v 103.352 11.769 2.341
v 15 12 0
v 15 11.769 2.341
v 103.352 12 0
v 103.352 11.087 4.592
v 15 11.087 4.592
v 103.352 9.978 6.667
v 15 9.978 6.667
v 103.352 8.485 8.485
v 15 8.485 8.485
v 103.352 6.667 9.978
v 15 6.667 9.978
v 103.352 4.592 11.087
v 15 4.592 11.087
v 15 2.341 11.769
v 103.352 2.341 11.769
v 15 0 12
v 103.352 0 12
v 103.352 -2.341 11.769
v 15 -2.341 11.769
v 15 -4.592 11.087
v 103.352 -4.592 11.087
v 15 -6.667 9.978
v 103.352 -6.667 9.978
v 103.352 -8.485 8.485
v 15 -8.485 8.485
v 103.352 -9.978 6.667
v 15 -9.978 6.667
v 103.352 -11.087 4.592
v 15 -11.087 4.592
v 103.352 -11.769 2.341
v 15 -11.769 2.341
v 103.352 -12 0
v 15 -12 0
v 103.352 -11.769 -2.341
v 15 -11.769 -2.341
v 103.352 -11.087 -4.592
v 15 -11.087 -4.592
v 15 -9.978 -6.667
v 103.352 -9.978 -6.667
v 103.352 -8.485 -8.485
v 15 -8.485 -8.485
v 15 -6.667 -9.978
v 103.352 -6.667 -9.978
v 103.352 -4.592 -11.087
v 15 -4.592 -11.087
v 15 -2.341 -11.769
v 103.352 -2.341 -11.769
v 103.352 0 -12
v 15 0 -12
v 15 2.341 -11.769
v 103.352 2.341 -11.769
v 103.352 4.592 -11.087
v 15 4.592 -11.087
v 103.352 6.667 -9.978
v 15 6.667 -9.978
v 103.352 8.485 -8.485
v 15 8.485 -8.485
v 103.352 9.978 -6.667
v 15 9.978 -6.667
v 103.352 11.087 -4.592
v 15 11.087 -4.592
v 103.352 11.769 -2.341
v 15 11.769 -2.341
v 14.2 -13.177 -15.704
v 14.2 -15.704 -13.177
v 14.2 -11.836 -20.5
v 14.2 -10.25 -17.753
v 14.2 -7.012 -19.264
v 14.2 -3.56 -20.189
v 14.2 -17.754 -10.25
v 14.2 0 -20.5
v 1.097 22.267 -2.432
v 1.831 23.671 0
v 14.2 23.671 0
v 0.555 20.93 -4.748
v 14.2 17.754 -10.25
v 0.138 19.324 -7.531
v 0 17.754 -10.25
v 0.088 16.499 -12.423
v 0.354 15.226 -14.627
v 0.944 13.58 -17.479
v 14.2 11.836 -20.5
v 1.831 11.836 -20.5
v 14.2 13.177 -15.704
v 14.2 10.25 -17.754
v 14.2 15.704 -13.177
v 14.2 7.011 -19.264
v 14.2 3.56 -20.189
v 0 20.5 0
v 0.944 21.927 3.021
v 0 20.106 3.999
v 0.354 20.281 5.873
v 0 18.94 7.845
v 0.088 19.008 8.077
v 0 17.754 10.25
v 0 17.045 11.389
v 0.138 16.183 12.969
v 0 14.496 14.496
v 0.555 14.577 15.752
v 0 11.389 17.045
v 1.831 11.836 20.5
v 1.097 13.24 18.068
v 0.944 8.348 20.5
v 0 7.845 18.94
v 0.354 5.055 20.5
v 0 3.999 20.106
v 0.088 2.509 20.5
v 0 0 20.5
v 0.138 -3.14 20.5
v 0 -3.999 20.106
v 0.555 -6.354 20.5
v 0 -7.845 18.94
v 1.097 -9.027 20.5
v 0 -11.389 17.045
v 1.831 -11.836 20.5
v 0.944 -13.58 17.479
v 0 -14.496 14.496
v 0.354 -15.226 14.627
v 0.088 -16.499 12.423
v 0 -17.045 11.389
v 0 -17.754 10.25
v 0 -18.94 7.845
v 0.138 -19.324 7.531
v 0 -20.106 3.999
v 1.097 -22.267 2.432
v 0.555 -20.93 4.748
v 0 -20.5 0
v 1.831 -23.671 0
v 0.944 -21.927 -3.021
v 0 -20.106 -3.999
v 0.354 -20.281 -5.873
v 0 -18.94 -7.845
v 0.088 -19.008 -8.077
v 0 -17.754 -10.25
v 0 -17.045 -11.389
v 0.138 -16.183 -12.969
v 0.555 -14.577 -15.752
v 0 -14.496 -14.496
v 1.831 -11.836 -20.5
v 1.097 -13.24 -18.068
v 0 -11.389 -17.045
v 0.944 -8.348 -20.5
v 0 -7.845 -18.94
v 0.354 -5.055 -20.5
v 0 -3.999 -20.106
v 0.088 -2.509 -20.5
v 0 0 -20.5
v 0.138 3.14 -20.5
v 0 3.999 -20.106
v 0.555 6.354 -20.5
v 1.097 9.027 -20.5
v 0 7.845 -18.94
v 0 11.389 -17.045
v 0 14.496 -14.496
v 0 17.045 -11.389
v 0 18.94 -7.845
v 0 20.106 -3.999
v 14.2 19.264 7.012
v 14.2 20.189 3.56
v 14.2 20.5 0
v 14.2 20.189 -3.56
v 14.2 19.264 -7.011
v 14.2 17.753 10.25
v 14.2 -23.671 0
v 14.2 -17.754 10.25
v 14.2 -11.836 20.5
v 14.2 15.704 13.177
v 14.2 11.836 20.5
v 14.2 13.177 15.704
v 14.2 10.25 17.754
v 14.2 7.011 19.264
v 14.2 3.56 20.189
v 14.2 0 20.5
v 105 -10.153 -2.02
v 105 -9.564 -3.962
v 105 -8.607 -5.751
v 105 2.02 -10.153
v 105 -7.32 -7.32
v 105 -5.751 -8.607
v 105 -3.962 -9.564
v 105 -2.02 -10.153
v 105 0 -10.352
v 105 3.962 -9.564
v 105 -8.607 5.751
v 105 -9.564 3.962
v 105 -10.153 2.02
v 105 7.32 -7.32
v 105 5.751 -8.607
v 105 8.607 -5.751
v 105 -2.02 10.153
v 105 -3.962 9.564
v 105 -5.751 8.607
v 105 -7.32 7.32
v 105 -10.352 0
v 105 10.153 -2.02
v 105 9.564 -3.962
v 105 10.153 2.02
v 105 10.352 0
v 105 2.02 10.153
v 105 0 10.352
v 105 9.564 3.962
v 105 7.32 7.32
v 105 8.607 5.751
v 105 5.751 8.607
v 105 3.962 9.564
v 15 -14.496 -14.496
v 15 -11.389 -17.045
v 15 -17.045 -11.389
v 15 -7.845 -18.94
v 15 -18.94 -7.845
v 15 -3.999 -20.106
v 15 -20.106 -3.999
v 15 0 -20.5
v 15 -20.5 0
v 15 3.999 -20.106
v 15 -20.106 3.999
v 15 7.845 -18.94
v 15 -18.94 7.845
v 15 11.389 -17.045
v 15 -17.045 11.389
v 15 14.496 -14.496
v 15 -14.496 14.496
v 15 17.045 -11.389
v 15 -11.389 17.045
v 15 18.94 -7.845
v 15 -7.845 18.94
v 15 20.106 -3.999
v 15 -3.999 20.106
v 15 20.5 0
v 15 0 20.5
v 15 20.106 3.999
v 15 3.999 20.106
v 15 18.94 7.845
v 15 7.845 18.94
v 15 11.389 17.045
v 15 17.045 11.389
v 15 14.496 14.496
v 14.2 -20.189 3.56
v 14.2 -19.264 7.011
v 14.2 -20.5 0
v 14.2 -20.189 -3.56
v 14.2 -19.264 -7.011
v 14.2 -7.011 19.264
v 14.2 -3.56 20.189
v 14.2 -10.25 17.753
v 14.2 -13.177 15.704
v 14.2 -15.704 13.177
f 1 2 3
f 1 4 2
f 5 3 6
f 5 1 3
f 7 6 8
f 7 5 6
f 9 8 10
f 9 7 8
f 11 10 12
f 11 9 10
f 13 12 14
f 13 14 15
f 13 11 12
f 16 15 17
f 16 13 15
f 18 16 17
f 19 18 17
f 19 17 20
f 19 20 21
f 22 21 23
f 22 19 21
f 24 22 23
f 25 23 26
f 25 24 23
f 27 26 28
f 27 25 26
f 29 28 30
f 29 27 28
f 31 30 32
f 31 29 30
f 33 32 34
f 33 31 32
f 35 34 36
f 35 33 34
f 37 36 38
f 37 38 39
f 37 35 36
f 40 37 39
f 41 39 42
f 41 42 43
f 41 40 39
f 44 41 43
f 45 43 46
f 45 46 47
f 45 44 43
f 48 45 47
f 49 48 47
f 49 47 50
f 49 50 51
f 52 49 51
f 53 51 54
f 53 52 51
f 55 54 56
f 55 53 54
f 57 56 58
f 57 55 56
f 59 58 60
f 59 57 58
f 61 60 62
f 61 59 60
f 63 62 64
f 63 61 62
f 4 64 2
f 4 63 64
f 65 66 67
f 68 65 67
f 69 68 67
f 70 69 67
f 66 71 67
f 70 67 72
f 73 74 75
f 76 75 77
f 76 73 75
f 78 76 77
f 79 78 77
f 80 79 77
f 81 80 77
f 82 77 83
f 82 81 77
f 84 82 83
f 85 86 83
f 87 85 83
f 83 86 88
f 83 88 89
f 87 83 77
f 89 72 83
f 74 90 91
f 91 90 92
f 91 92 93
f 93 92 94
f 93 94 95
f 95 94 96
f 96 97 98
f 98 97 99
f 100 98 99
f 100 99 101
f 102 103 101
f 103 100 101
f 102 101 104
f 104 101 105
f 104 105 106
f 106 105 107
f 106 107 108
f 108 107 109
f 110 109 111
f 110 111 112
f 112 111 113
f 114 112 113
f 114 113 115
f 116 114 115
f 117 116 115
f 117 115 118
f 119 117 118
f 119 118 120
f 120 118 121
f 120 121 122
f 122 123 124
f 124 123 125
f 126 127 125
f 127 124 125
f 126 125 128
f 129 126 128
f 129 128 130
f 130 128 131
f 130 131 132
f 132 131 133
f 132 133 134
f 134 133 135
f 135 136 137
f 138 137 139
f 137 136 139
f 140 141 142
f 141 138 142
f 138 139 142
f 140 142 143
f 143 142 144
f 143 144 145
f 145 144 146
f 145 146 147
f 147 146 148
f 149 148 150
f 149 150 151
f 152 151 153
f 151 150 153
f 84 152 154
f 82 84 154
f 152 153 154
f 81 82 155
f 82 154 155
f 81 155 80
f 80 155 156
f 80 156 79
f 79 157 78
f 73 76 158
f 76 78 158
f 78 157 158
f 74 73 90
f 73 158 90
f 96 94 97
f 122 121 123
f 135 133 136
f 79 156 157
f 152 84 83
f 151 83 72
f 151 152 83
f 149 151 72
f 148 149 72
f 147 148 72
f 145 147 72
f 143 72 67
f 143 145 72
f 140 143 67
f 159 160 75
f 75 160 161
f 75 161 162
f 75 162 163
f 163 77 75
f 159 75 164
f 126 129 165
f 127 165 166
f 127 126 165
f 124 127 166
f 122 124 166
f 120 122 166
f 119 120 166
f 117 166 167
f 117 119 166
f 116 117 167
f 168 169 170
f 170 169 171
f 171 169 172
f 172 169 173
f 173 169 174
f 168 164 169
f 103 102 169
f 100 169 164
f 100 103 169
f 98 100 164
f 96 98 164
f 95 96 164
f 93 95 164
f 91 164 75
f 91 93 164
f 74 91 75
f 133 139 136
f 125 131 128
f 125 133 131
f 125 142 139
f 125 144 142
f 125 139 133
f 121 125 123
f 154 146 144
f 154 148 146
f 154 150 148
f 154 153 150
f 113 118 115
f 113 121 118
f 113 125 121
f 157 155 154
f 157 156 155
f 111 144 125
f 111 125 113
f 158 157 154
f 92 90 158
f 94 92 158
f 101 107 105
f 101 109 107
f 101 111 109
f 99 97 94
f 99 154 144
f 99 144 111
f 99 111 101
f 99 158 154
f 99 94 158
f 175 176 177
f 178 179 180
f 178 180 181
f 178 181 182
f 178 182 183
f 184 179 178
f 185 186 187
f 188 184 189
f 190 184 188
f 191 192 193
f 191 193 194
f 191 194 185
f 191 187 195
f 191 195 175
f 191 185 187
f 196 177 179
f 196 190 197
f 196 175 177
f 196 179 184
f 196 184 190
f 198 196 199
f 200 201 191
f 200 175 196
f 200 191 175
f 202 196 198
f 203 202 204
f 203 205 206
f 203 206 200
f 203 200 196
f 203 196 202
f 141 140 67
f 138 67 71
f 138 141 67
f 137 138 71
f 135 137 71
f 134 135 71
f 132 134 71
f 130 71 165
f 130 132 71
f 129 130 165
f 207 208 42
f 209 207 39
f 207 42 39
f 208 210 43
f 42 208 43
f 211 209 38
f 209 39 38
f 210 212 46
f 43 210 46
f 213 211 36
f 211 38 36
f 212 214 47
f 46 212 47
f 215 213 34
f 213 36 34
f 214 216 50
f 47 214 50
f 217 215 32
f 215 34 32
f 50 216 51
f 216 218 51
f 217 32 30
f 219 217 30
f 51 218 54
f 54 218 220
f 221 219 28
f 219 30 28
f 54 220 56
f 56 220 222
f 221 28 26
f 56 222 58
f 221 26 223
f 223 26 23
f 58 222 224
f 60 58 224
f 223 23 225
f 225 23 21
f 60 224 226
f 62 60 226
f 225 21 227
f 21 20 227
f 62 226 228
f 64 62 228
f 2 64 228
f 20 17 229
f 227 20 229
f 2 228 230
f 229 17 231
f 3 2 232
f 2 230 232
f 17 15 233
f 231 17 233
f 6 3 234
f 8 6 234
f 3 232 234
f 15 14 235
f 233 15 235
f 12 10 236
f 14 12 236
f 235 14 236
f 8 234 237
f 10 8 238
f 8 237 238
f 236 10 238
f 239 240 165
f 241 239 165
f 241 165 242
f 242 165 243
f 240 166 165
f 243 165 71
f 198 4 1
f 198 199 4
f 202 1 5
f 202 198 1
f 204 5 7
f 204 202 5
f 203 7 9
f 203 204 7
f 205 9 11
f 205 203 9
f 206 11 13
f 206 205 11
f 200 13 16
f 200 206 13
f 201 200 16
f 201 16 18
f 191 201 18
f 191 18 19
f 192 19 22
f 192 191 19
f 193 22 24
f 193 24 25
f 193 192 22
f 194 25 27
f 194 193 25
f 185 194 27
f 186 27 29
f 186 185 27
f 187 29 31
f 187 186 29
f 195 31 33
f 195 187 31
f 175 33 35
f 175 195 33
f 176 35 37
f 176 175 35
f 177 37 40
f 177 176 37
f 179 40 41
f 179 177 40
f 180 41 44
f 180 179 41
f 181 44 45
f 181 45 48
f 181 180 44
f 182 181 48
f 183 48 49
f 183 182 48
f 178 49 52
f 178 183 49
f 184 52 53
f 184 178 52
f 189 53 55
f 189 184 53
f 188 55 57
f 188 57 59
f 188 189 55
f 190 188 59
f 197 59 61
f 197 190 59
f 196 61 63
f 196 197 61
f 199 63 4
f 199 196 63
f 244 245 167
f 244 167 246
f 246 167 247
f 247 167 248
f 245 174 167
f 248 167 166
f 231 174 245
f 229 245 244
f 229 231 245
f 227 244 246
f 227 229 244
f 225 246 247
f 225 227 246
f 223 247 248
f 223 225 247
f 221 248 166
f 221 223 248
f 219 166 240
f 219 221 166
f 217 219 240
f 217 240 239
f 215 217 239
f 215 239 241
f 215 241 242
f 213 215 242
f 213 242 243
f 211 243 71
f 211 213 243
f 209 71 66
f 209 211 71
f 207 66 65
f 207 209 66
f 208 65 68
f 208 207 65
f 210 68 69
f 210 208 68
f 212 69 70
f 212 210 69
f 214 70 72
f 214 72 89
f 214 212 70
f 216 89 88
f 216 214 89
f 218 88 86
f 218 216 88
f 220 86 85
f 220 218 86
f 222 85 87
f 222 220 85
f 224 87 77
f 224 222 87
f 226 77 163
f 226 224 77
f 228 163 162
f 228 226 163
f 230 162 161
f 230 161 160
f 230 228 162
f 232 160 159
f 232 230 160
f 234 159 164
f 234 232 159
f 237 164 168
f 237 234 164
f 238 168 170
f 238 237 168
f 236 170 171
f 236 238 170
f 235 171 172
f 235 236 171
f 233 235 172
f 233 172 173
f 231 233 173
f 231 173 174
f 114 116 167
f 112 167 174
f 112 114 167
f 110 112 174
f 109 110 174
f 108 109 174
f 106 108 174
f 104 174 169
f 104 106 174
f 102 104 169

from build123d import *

# Parameters (mm, degrees)
BASEHEAD_DEPTH = 15
SKETCH4_W      = 0.8
SKETCH4_H      = 13.171361037


# Read off the part's stored shape, not the designer's step: HeadChamfer
with BuildPart() as part:
    # Sketch1 → BaseHead (new body)
    with BuildSketch(Plane(origin=(0, 0, 0), x_dir=(0, 0, -1), z_dir=(1, 0, 0))):
        Polygon((20.5, 11.835680518), (20.5, -11.835680518), (0, -23.671361037), (-20.5, -11.835680518), (-20.5, 11.835680518), (0, 23.671361037), align=None)
    extrude(amount=BASEHEAD_DEPTH)

    # HeadChamfer outline → HeadChamfer (revolve, cut)
    with BuildSketch(Plane.YX):
        Polygon((23.671361268, 1.830986282), (20.499999702, -1.72e-07), (23.671361268, -1.72e-07), align=None)
    revolve(axis=Axis((0, 0, 0), (1, 0, 0)), mode=Mode.SUBTRACT)

    # HeadChamfer 2 outline → HeadChamfer 2 (revolve)
    with BuildSketch(Plane.YX):
        Polygon((12, 15), (12, 103.352), (10.352, 105), (0, 105), (0, 15), align=None)
    revolve(axis=Axis((0, 0, 0), (1, 0, 0)))

    # Sketch4 → BearingFace (revolve, cut)
    with BuildSketch(Plane.XY, mode=Mode.PRIVATE) as bearingface_sk:
        with Locations((14.6, 27.085680519)):
            Rectangle(SKETCH4_W, SKETCH4_H)
    revolve(bearingface_sk.sketch.rotate(Axis((0, 0, 0), (1, 0, 0)), 90), axis=Axis((0, 0, 0), (1, 0, 0)), mode=Mode.SUBTRACT)


solid = part.part
